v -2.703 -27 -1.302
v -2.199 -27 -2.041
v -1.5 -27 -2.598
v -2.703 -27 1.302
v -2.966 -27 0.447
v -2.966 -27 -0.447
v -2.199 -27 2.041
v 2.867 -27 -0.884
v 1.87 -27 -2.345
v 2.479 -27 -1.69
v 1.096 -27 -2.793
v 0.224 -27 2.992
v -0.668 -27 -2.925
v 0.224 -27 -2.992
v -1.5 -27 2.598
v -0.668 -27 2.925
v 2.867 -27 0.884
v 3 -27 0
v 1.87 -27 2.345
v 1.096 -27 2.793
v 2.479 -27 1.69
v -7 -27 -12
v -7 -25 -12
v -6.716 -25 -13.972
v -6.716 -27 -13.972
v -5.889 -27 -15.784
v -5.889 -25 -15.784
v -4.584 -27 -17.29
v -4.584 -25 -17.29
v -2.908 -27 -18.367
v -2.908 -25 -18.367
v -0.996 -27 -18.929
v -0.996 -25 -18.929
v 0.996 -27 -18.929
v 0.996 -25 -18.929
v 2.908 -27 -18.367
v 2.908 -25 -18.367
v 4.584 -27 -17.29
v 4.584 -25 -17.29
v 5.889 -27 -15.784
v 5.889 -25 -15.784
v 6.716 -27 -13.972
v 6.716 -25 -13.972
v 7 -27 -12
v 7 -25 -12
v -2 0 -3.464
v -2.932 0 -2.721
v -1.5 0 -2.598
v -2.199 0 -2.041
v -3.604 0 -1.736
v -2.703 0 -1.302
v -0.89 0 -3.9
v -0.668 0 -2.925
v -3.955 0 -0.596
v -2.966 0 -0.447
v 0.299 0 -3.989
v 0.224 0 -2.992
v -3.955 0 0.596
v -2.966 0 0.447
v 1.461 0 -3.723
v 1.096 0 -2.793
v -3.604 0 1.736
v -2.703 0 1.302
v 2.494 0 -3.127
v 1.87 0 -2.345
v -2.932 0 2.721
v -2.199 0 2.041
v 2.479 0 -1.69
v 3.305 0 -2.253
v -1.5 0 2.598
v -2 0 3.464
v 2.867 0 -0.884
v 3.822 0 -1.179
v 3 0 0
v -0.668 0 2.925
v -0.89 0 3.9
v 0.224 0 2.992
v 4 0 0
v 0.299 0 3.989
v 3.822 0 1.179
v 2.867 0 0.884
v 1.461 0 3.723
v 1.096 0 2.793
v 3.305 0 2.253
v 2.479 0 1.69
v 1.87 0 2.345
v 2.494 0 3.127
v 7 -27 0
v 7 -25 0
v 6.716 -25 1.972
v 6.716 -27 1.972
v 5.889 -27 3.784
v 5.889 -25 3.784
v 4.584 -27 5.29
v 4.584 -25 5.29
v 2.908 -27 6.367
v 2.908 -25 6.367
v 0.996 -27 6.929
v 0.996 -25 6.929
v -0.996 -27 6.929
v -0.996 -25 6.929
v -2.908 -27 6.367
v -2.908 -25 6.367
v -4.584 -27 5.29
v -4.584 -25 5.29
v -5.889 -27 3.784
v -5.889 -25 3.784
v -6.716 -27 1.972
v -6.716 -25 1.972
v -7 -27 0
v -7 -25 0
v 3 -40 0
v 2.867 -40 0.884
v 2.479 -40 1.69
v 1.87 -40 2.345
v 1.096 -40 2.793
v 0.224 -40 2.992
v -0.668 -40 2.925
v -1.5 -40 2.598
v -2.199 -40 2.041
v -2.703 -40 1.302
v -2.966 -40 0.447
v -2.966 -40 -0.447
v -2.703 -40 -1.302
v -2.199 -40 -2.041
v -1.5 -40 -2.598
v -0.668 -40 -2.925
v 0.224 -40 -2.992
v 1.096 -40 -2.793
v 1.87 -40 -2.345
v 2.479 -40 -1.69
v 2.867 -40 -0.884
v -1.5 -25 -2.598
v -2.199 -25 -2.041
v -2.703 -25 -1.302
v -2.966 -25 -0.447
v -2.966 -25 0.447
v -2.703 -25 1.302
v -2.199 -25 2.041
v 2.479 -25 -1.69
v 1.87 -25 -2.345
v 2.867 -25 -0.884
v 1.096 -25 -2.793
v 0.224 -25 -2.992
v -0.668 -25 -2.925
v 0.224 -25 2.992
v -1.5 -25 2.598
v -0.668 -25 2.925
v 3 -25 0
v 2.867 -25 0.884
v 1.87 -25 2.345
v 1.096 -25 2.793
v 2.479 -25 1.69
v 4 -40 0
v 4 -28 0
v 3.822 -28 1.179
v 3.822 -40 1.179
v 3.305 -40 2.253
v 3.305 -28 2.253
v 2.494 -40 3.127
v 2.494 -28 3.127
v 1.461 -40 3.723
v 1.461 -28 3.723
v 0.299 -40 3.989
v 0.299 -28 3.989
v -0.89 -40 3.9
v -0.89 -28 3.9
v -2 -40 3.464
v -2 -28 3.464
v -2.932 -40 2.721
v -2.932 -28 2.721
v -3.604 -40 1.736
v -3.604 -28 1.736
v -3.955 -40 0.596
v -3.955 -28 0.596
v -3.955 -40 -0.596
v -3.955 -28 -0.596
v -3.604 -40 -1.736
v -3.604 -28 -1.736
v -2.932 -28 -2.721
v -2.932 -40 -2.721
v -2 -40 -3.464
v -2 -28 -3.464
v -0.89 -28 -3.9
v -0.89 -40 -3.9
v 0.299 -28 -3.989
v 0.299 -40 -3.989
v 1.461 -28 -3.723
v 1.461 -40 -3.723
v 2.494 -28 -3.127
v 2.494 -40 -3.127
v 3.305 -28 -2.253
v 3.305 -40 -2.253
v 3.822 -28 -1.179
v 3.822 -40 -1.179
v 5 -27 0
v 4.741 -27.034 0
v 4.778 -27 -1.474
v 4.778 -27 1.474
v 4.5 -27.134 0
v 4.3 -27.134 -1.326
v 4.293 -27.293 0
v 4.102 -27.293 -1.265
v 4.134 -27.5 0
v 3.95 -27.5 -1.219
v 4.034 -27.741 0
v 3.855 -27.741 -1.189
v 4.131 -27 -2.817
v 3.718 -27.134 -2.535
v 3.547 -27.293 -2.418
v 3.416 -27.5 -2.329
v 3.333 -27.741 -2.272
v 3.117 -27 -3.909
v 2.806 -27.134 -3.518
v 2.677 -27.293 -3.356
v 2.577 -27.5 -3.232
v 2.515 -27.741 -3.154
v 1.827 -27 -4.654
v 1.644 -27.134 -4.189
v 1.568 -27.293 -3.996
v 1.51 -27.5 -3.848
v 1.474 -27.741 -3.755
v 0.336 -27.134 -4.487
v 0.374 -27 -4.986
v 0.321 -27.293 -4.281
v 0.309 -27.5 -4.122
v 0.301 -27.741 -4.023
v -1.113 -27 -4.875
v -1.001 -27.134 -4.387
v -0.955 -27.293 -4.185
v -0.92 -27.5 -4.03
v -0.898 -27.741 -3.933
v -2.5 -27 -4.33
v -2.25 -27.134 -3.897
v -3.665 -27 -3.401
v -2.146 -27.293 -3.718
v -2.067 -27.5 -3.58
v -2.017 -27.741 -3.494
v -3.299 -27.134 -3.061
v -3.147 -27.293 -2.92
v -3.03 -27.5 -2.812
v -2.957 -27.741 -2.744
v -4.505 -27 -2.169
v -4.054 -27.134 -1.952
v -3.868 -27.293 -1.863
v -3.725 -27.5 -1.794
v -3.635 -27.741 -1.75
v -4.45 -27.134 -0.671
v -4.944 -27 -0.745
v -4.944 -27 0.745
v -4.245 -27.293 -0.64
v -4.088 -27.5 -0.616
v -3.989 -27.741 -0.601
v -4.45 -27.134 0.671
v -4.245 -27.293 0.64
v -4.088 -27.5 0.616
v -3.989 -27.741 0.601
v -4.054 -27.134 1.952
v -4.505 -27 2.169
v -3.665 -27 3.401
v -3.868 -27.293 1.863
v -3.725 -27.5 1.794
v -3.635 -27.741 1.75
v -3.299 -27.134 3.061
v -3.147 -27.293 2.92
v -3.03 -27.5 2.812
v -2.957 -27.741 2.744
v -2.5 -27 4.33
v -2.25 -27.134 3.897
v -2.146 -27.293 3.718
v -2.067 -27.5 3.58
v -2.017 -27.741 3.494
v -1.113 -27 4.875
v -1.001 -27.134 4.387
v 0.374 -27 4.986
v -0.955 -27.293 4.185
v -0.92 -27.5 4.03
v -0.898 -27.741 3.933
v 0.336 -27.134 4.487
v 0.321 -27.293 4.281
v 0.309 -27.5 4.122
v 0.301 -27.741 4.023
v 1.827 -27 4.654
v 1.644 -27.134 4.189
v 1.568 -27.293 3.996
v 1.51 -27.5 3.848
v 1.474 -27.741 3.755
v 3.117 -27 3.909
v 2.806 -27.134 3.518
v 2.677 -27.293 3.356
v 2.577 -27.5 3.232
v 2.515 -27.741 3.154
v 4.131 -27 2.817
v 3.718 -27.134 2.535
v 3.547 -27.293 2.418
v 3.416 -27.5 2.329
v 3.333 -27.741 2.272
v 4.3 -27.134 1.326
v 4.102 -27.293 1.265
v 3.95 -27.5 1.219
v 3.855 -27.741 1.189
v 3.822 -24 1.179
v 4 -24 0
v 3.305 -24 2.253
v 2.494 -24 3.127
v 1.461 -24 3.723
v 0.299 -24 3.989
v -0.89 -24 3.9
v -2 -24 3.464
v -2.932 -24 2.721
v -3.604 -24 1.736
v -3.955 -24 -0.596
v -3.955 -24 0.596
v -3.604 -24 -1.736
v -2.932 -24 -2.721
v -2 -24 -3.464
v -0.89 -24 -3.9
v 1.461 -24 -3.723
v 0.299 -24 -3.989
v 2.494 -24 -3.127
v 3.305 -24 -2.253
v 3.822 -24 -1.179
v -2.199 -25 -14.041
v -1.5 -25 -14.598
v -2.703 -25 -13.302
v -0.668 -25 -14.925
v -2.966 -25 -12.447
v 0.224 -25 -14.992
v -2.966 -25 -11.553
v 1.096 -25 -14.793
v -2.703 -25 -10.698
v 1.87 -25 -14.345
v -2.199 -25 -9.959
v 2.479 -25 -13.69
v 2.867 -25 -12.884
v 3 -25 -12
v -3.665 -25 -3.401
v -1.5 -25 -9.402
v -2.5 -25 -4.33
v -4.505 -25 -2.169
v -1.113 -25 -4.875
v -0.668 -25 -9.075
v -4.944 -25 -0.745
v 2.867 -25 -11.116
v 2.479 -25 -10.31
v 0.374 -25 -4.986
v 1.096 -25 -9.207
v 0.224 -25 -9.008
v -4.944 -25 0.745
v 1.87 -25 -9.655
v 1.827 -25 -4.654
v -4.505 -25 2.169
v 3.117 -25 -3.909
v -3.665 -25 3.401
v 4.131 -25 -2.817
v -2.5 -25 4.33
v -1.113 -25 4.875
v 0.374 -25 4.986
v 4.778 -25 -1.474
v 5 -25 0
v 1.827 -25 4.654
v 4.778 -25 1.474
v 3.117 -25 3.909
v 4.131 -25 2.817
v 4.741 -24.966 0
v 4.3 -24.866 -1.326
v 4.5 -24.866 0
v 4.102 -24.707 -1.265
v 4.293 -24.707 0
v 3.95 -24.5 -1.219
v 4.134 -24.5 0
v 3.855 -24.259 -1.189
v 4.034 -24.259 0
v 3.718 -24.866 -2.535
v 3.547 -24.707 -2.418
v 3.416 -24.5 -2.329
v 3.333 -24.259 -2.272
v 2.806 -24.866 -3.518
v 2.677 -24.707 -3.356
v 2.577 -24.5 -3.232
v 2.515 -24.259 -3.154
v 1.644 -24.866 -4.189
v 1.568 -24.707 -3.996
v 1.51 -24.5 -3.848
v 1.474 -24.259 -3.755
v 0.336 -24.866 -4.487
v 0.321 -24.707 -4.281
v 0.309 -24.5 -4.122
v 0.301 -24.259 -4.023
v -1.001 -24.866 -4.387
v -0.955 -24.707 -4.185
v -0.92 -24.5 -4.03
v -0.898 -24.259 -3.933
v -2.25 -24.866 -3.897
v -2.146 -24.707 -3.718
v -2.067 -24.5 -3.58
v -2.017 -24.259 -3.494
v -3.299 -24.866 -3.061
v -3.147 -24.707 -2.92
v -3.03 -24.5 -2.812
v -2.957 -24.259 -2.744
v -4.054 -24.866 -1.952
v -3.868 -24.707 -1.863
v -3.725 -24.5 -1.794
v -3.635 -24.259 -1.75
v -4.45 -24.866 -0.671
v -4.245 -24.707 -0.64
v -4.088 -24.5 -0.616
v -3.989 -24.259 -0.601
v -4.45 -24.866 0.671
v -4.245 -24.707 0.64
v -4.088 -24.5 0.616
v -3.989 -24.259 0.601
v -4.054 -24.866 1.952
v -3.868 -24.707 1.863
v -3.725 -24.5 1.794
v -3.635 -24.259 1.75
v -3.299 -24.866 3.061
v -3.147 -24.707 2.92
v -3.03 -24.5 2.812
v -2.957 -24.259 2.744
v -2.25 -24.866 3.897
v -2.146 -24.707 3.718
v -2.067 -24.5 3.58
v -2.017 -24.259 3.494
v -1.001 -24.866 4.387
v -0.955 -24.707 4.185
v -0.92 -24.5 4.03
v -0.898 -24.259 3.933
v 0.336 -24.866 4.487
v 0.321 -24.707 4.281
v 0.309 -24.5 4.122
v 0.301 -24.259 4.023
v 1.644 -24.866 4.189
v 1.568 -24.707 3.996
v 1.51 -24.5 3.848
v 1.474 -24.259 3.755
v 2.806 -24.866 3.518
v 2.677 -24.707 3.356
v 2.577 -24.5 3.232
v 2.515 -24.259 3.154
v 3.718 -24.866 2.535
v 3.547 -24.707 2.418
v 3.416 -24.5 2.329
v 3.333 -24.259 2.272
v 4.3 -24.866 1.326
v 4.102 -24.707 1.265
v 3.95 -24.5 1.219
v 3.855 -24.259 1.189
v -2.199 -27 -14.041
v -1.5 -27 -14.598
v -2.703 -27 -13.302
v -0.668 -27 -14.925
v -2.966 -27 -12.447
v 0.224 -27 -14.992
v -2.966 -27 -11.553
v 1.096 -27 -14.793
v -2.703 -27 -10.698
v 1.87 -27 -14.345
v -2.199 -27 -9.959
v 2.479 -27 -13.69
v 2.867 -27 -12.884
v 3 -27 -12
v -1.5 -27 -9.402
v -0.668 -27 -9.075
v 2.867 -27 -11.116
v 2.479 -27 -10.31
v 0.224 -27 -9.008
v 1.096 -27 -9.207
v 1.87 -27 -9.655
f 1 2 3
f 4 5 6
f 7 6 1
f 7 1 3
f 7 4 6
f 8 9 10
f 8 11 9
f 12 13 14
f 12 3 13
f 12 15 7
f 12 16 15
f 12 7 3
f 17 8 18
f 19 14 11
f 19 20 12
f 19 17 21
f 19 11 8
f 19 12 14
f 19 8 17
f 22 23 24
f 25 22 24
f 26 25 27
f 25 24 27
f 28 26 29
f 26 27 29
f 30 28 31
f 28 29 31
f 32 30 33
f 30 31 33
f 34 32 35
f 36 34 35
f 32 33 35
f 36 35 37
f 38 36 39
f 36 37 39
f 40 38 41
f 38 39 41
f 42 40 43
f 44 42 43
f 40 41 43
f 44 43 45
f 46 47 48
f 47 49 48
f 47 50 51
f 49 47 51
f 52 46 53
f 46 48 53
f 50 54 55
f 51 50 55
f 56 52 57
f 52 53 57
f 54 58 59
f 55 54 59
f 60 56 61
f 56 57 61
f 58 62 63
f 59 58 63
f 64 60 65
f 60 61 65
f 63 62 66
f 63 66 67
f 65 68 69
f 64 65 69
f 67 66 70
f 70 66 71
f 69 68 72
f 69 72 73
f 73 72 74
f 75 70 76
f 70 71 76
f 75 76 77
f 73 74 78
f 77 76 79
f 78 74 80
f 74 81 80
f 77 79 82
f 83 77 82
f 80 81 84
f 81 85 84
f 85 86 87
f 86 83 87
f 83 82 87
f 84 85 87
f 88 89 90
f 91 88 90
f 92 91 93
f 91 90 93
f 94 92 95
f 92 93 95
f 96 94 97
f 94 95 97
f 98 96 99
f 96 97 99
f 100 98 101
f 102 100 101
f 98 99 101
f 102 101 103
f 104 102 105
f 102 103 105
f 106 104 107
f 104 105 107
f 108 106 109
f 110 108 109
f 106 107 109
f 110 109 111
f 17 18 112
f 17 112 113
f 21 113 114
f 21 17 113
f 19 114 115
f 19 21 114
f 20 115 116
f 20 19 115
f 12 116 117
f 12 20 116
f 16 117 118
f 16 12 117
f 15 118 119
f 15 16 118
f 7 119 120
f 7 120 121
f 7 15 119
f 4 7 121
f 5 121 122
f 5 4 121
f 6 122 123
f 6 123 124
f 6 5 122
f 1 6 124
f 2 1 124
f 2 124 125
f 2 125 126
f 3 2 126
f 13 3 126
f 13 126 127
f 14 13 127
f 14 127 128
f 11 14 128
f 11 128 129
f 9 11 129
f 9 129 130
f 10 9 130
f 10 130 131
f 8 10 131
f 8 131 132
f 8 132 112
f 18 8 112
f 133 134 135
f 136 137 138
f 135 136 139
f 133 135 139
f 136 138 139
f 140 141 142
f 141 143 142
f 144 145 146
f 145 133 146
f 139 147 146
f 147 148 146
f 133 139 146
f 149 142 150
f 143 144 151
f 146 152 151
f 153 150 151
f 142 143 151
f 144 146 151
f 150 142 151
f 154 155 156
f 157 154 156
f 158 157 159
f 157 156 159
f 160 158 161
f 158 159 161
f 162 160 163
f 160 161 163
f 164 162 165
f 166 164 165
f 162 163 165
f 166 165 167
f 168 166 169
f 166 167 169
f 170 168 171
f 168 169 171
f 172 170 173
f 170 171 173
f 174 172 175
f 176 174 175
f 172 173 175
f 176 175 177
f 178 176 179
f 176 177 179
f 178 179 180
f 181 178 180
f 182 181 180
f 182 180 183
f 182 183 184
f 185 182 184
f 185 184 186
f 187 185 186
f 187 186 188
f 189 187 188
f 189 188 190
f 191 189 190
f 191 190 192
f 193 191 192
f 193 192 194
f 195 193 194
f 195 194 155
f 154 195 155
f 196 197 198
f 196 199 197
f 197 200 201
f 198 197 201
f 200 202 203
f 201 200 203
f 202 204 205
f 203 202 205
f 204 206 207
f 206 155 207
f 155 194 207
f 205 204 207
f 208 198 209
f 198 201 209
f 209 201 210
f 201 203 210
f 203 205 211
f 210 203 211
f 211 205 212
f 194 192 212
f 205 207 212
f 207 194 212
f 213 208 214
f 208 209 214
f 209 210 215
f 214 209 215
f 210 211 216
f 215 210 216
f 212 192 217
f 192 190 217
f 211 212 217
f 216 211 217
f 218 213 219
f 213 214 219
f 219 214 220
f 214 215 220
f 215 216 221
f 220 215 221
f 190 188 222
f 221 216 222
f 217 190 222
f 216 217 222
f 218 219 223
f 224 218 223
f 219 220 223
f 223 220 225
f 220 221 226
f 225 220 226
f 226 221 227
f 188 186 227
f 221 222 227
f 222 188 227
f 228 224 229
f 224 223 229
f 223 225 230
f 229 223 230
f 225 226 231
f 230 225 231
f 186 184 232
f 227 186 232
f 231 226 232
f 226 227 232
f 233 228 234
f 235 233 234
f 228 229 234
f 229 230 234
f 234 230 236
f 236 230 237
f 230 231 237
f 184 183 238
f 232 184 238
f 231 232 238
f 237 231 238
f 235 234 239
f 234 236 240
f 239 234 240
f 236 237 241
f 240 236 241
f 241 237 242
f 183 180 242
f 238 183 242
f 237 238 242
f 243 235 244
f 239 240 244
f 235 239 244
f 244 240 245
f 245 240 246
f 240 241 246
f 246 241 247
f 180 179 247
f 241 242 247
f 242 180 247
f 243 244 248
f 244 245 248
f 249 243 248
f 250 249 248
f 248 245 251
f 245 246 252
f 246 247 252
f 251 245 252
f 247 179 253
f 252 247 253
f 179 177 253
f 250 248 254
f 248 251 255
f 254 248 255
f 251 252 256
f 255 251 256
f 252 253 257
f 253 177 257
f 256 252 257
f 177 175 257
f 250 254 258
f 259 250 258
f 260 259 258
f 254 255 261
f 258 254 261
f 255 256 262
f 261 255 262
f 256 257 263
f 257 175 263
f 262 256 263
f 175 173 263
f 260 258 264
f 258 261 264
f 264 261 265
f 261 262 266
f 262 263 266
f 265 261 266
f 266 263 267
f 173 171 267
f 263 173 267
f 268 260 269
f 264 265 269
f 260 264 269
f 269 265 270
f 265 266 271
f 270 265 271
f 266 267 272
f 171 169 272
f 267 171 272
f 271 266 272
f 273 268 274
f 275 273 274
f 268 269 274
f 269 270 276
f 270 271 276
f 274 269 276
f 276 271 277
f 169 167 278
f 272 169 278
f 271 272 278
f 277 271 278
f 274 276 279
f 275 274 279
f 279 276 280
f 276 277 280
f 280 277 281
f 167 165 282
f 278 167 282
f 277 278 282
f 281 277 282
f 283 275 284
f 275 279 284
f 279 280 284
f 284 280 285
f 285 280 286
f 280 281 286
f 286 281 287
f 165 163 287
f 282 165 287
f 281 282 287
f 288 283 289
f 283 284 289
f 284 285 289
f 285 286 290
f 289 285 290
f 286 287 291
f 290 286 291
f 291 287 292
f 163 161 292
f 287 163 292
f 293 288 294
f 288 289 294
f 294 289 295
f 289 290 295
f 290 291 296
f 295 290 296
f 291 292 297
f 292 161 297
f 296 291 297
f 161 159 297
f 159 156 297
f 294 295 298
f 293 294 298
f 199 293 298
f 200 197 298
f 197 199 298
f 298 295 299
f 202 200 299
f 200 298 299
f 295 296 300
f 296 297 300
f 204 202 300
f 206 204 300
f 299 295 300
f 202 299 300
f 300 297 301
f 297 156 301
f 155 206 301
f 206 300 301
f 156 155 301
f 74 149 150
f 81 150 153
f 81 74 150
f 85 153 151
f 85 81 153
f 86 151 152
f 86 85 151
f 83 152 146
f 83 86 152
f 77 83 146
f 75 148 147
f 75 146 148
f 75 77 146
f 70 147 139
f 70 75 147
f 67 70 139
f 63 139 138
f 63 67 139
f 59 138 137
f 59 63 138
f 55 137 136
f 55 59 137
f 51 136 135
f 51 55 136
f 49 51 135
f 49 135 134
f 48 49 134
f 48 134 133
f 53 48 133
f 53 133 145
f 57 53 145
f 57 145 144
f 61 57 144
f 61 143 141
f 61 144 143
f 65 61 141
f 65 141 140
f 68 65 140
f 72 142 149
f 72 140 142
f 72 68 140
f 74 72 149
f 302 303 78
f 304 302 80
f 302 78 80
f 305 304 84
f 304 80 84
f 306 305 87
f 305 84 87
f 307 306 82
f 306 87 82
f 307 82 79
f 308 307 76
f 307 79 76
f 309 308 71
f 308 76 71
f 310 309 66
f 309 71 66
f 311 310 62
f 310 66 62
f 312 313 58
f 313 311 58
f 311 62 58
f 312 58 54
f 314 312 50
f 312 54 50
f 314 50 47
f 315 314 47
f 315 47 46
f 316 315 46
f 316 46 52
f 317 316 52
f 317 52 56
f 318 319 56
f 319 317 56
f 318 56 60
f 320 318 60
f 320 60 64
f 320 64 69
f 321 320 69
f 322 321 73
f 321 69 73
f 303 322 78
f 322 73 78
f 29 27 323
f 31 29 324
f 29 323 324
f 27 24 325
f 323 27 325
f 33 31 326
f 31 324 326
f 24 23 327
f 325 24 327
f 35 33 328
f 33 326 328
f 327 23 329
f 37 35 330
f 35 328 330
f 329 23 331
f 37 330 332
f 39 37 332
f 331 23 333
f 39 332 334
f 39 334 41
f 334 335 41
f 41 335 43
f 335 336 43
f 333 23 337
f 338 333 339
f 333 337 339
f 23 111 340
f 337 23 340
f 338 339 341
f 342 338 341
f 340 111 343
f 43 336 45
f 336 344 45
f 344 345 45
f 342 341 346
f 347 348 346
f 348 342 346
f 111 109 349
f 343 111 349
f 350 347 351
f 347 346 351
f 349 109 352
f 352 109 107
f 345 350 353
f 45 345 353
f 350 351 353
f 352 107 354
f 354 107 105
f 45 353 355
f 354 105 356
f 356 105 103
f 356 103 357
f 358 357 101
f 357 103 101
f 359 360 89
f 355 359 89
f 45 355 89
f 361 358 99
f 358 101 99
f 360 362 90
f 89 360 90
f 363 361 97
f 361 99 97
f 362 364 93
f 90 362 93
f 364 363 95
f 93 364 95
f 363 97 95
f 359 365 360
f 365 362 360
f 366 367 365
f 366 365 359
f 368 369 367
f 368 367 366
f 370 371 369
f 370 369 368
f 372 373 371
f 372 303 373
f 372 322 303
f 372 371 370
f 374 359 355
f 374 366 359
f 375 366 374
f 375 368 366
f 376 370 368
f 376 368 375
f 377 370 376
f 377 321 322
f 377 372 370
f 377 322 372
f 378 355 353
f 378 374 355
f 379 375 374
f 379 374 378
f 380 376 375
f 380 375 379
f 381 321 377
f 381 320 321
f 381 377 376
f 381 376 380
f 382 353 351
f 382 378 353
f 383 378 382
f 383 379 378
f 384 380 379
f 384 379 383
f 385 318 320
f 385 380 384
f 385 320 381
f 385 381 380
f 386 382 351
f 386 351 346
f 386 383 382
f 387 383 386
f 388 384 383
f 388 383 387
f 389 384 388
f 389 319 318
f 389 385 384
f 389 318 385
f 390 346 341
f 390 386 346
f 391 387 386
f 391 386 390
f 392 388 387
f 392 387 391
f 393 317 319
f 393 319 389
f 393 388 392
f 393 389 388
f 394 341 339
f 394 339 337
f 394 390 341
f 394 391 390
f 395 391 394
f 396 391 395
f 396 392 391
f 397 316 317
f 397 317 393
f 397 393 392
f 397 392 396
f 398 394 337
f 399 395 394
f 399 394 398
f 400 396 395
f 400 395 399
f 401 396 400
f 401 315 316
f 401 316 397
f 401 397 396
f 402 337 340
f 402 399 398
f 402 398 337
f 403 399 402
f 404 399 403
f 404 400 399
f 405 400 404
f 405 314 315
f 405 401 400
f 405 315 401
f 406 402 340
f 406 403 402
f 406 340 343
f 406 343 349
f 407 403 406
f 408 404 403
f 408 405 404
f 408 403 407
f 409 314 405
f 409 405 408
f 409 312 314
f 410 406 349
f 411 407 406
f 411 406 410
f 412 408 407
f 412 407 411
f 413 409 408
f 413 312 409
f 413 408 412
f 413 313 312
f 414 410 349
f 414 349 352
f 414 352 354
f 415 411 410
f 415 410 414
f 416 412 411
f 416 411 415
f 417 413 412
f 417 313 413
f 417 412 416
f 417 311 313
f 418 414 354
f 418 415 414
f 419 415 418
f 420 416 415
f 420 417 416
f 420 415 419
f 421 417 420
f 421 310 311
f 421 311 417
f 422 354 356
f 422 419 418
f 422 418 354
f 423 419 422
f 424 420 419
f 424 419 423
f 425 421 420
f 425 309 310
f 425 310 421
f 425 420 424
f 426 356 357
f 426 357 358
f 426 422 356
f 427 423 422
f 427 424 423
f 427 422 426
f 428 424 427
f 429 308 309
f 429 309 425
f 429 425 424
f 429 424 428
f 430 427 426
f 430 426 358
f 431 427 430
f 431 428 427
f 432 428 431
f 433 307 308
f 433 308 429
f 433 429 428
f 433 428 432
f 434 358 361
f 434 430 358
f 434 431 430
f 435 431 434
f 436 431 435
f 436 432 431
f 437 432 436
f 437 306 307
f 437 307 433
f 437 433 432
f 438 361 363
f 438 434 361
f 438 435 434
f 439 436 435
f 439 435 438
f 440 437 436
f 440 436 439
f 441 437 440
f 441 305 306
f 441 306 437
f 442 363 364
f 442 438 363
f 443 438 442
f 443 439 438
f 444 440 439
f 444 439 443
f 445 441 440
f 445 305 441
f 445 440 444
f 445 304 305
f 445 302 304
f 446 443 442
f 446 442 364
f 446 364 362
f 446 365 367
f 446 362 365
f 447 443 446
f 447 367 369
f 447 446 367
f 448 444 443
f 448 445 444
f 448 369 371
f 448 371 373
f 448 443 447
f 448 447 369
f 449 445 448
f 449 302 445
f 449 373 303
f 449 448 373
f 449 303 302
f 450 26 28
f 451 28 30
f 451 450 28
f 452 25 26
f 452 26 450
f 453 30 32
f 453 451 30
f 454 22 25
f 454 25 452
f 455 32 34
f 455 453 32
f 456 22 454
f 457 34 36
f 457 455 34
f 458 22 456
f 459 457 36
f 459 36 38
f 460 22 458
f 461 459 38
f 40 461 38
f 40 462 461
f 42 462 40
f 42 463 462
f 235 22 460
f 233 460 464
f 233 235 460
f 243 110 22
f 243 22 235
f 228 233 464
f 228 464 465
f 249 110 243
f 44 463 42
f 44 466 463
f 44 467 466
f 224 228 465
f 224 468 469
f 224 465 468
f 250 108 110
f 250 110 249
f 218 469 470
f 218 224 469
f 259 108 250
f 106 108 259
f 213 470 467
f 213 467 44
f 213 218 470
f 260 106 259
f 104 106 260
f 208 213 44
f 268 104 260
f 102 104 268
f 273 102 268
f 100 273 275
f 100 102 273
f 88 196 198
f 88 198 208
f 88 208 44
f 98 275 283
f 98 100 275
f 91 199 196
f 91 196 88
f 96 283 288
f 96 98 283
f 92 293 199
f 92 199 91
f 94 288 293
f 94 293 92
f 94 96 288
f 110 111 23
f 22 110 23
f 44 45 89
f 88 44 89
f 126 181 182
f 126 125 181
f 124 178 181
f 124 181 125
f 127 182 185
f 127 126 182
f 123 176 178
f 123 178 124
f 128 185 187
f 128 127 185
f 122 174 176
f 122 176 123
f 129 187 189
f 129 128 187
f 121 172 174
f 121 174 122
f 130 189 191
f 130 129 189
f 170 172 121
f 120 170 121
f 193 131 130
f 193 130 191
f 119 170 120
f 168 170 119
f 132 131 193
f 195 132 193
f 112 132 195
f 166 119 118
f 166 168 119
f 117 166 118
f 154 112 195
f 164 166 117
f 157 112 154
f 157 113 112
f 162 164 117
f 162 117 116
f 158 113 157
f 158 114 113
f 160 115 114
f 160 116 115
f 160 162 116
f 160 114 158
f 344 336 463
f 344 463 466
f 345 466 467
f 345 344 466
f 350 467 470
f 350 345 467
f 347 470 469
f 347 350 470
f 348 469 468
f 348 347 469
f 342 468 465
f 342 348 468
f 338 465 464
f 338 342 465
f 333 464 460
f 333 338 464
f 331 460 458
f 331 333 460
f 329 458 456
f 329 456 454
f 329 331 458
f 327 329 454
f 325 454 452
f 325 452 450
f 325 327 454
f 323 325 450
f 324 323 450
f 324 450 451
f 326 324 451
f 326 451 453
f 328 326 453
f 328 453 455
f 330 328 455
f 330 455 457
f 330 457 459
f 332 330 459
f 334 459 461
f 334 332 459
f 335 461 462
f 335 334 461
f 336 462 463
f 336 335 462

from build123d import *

# Parameters (mm, degrees)
F0_R     = 4
F0_R_2   = 3
F1_DEPTH = 40
F3_R     = 3
F4_DEPTH = 2
F5_R     = 1


with BuildPart() as f1:
    # F0 (on Front) → F1 (new body)
    with BuildSketch(Plane.XZ):
        Circle(F0_R)
        Circle(F0_R_2, mode=Mode.SUBTRACT)
    extrude(amount=F1_DEPTH)

    # F3 (on offset) → F4 (join)
    with BuildSketch(Plane.XZ.offset(25)):
        with BuildLine():
            Line((-7, 0), (-7, -12))
            ThreePointArc((-7, -12), (0, -19), (7, -12))
            Line((7, -12), (7, 0))
            ThreePointArc((7, 0), (0, 7), (-7, 0))
        make_face()
        with Locations((0, -12)):
            Circle(F3_R, mode=Mode.SUBTRACT)
    extrude(amount=F4_DEPTH)

    # F5
    f5_edges = [f1.edges().sort_by_distance(p)[0] for p in [
        (-4, -27, 0),
        (-4, -25, 0),
    ]]
    fillet(f5_edges, radius=F5_R)


solid = f1.part
